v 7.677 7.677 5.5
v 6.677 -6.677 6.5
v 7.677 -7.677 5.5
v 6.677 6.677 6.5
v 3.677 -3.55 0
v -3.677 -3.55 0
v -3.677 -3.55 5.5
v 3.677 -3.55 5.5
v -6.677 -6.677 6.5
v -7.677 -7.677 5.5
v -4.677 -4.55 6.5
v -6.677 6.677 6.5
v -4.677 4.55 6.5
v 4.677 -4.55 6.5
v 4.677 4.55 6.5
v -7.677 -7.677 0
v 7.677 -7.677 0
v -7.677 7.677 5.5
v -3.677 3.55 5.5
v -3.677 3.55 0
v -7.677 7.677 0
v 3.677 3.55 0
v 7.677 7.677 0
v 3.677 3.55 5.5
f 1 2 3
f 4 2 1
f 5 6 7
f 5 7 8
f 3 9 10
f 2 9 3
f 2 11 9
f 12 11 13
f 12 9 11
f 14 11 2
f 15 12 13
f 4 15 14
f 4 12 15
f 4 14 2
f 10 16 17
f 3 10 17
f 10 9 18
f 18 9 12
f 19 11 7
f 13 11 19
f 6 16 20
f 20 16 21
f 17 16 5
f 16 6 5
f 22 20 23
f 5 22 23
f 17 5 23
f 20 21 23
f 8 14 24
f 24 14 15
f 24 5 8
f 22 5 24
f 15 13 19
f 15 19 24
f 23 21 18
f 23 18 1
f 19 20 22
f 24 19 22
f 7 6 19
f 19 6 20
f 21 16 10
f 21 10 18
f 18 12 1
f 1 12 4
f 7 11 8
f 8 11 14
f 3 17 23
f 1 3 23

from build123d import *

# Parameters (mm, degrees)
SKETCH1_W           = 15.353910524
SKETCH1_H           = 15.353910524
SKETCH1_W_2         = 7.353910524
SKETCH1_H_2         = 7.1
BOSS_EXTRUDE1_DEPTH = 6.5
CHAMFER1_SIZE       = 1


with BuildPart() as part:
    # Sketch1 → Boss-Extrude1 (new body)
    with BuildSketch(Plane.XY):
        Rectangle(SKETCH1_W, SKETCH1_H)
        Rectangle(SKETCH1_W_2, SKETCH1_H_2, mode=Mode.SUBTRACT)
    extrude(amount=BOSS_EXTRUDE1_DEPTH)

    # Chamfer1
    chamfer1_edges = [part.edges().sort_by_distance(p)[0] for p in [
        (7.676955262, 0, 6.5),
        (-3.676955262, 0, 6.5),
        (0, 7.676955262, 6.5),
        (0, -3.55, 6.5),
        (3.676955262, 0, 6.5),
        (0, 3.55, 6.5),
        (-7.676955262, 0, 6.5),
        (0, -7.676955262, 6.5),
    ]]
    chamfer(chamfer1_edges, length=CHAMFER1_SIZE)


solid = part.part
